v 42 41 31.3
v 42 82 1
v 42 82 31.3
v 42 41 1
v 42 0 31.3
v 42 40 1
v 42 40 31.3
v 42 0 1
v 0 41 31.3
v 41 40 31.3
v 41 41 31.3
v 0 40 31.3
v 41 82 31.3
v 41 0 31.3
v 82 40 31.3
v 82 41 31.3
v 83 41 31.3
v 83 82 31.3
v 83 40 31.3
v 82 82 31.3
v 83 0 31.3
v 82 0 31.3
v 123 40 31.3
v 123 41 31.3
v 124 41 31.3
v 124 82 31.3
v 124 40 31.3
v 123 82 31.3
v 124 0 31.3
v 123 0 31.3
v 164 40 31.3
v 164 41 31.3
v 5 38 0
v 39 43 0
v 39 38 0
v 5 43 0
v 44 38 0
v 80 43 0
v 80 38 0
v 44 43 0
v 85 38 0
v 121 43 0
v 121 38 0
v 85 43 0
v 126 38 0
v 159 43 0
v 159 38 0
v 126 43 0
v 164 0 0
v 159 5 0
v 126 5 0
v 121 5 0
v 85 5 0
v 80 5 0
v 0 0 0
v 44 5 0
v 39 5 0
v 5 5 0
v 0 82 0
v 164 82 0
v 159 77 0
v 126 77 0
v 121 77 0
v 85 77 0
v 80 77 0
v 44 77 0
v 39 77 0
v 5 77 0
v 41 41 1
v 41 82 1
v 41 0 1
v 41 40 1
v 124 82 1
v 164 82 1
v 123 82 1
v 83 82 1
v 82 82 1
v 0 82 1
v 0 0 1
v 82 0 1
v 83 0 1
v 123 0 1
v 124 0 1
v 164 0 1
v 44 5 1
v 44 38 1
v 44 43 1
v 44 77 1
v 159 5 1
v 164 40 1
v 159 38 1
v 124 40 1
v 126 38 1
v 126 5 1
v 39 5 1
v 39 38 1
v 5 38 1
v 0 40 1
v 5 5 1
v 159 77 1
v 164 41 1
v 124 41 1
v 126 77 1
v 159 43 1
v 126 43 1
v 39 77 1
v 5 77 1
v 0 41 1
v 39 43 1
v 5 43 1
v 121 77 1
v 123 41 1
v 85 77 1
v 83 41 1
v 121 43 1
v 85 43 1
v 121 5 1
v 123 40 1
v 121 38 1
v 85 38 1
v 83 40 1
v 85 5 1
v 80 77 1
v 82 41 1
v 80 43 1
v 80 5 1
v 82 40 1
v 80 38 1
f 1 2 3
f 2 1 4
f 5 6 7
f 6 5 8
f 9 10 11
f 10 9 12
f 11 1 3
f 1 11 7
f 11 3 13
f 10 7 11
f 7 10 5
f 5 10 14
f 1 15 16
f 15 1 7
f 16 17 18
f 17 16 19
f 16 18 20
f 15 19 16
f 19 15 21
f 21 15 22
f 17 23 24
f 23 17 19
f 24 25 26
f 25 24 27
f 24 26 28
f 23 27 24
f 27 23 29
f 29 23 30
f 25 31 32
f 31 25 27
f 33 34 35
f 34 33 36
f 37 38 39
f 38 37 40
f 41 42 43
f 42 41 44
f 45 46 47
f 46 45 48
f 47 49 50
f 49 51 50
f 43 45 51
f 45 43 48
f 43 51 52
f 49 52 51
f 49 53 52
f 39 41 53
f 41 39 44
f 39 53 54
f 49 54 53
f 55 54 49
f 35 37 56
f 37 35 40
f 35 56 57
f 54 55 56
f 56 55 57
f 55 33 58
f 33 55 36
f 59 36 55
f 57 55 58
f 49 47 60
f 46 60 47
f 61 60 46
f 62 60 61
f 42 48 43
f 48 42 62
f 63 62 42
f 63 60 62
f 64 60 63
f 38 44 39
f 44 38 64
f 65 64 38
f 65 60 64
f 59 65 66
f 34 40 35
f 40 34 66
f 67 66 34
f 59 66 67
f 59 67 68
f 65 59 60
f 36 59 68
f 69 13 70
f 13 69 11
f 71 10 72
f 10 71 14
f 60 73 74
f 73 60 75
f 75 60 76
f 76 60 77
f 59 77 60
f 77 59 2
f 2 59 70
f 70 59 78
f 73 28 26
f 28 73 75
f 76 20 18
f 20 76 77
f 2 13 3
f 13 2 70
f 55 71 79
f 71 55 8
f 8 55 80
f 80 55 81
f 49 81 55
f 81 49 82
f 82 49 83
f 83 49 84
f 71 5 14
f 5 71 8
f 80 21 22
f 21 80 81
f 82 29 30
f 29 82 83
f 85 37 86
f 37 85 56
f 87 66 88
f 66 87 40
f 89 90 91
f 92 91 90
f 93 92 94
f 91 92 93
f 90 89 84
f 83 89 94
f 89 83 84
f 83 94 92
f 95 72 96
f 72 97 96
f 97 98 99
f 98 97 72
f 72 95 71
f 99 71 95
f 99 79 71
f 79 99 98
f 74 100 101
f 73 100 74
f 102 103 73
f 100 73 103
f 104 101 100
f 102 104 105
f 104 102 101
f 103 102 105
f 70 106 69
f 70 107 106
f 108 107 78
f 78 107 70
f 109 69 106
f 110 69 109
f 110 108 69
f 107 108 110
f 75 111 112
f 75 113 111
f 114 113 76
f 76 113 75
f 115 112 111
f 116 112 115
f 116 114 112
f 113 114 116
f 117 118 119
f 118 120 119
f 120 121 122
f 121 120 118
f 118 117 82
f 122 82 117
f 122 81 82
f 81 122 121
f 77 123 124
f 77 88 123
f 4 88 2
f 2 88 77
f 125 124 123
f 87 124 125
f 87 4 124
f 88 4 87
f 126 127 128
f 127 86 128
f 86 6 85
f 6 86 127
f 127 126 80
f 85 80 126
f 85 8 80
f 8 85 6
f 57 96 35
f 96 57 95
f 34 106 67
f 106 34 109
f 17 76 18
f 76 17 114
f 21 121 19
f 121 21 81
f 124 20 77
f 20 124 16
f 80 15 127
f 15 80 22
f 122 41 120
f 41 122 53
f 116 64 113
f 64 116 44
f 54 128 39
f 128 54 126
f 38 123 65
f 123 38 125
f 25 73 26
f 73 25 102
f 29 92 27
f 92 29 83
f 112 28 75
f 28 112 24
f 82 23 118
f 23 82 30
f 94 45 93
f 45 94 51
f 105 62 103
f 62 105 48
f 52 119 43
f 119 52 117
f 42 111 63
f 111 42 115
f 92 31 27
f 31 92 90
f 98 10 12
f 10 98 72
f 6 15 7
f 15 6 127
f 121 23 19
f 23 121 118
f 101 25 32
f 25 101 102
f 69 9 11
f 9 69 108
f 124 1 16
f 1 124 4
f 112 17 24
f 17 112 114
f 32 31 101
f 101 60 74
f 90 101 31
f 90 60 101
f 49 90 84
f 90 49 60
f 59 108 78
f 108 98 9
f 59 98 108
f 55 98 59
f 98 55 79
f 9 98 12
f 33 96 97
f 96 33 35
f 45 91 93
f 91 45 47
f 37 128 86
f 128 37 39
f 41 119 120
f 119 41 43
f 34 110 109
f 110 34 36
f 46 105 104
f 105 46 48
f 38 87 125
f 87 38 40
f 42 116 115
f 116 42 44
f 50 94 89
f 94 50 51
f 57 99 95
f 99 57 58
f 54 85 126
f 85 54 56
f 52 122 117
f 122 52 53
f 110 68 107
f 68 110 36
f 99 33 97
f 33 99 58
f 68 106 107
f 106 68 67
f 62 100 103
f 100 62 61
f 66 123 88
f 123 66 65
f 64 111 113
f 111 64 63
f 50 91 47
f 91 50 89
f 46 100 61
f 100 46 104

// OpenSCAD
height=31.3;
depth=82; // 84 input -> 84.75 output -> 82.66 trimmed. revised to 82
width=164; // 165 -> 164

thickness=1;



module ns_divider(length, edge=false) {
    if (!edge) {
        cube([thickness,length,height]);
        translate([-2*thickness,0,0]) cube([thickness*5,length,thickness]);
    } else {
        cube([thickness*5,length,thickness]);
    }
}

module ew_divider(length, edge=false) {
    rotate([0,0,-90]) ns_divider(length, edge);
}

module interior() {
    for (o = [width/4:width/4:width-1]) {
        translate([o,0,0]) ns_divider(depth);
    }
    translate([0,depth/2,0]) ew_divider(width);

    translate([0,5*thickness,0]) ew_divider(width,true);
    ns_divider(depth,true);
    translate([0,depth]) ew_divider(width,true);
    translate([width-5*thickness,0,0]) ns_divider(depth,true);
}

    interior();
//    cube([width,depth,height]);
